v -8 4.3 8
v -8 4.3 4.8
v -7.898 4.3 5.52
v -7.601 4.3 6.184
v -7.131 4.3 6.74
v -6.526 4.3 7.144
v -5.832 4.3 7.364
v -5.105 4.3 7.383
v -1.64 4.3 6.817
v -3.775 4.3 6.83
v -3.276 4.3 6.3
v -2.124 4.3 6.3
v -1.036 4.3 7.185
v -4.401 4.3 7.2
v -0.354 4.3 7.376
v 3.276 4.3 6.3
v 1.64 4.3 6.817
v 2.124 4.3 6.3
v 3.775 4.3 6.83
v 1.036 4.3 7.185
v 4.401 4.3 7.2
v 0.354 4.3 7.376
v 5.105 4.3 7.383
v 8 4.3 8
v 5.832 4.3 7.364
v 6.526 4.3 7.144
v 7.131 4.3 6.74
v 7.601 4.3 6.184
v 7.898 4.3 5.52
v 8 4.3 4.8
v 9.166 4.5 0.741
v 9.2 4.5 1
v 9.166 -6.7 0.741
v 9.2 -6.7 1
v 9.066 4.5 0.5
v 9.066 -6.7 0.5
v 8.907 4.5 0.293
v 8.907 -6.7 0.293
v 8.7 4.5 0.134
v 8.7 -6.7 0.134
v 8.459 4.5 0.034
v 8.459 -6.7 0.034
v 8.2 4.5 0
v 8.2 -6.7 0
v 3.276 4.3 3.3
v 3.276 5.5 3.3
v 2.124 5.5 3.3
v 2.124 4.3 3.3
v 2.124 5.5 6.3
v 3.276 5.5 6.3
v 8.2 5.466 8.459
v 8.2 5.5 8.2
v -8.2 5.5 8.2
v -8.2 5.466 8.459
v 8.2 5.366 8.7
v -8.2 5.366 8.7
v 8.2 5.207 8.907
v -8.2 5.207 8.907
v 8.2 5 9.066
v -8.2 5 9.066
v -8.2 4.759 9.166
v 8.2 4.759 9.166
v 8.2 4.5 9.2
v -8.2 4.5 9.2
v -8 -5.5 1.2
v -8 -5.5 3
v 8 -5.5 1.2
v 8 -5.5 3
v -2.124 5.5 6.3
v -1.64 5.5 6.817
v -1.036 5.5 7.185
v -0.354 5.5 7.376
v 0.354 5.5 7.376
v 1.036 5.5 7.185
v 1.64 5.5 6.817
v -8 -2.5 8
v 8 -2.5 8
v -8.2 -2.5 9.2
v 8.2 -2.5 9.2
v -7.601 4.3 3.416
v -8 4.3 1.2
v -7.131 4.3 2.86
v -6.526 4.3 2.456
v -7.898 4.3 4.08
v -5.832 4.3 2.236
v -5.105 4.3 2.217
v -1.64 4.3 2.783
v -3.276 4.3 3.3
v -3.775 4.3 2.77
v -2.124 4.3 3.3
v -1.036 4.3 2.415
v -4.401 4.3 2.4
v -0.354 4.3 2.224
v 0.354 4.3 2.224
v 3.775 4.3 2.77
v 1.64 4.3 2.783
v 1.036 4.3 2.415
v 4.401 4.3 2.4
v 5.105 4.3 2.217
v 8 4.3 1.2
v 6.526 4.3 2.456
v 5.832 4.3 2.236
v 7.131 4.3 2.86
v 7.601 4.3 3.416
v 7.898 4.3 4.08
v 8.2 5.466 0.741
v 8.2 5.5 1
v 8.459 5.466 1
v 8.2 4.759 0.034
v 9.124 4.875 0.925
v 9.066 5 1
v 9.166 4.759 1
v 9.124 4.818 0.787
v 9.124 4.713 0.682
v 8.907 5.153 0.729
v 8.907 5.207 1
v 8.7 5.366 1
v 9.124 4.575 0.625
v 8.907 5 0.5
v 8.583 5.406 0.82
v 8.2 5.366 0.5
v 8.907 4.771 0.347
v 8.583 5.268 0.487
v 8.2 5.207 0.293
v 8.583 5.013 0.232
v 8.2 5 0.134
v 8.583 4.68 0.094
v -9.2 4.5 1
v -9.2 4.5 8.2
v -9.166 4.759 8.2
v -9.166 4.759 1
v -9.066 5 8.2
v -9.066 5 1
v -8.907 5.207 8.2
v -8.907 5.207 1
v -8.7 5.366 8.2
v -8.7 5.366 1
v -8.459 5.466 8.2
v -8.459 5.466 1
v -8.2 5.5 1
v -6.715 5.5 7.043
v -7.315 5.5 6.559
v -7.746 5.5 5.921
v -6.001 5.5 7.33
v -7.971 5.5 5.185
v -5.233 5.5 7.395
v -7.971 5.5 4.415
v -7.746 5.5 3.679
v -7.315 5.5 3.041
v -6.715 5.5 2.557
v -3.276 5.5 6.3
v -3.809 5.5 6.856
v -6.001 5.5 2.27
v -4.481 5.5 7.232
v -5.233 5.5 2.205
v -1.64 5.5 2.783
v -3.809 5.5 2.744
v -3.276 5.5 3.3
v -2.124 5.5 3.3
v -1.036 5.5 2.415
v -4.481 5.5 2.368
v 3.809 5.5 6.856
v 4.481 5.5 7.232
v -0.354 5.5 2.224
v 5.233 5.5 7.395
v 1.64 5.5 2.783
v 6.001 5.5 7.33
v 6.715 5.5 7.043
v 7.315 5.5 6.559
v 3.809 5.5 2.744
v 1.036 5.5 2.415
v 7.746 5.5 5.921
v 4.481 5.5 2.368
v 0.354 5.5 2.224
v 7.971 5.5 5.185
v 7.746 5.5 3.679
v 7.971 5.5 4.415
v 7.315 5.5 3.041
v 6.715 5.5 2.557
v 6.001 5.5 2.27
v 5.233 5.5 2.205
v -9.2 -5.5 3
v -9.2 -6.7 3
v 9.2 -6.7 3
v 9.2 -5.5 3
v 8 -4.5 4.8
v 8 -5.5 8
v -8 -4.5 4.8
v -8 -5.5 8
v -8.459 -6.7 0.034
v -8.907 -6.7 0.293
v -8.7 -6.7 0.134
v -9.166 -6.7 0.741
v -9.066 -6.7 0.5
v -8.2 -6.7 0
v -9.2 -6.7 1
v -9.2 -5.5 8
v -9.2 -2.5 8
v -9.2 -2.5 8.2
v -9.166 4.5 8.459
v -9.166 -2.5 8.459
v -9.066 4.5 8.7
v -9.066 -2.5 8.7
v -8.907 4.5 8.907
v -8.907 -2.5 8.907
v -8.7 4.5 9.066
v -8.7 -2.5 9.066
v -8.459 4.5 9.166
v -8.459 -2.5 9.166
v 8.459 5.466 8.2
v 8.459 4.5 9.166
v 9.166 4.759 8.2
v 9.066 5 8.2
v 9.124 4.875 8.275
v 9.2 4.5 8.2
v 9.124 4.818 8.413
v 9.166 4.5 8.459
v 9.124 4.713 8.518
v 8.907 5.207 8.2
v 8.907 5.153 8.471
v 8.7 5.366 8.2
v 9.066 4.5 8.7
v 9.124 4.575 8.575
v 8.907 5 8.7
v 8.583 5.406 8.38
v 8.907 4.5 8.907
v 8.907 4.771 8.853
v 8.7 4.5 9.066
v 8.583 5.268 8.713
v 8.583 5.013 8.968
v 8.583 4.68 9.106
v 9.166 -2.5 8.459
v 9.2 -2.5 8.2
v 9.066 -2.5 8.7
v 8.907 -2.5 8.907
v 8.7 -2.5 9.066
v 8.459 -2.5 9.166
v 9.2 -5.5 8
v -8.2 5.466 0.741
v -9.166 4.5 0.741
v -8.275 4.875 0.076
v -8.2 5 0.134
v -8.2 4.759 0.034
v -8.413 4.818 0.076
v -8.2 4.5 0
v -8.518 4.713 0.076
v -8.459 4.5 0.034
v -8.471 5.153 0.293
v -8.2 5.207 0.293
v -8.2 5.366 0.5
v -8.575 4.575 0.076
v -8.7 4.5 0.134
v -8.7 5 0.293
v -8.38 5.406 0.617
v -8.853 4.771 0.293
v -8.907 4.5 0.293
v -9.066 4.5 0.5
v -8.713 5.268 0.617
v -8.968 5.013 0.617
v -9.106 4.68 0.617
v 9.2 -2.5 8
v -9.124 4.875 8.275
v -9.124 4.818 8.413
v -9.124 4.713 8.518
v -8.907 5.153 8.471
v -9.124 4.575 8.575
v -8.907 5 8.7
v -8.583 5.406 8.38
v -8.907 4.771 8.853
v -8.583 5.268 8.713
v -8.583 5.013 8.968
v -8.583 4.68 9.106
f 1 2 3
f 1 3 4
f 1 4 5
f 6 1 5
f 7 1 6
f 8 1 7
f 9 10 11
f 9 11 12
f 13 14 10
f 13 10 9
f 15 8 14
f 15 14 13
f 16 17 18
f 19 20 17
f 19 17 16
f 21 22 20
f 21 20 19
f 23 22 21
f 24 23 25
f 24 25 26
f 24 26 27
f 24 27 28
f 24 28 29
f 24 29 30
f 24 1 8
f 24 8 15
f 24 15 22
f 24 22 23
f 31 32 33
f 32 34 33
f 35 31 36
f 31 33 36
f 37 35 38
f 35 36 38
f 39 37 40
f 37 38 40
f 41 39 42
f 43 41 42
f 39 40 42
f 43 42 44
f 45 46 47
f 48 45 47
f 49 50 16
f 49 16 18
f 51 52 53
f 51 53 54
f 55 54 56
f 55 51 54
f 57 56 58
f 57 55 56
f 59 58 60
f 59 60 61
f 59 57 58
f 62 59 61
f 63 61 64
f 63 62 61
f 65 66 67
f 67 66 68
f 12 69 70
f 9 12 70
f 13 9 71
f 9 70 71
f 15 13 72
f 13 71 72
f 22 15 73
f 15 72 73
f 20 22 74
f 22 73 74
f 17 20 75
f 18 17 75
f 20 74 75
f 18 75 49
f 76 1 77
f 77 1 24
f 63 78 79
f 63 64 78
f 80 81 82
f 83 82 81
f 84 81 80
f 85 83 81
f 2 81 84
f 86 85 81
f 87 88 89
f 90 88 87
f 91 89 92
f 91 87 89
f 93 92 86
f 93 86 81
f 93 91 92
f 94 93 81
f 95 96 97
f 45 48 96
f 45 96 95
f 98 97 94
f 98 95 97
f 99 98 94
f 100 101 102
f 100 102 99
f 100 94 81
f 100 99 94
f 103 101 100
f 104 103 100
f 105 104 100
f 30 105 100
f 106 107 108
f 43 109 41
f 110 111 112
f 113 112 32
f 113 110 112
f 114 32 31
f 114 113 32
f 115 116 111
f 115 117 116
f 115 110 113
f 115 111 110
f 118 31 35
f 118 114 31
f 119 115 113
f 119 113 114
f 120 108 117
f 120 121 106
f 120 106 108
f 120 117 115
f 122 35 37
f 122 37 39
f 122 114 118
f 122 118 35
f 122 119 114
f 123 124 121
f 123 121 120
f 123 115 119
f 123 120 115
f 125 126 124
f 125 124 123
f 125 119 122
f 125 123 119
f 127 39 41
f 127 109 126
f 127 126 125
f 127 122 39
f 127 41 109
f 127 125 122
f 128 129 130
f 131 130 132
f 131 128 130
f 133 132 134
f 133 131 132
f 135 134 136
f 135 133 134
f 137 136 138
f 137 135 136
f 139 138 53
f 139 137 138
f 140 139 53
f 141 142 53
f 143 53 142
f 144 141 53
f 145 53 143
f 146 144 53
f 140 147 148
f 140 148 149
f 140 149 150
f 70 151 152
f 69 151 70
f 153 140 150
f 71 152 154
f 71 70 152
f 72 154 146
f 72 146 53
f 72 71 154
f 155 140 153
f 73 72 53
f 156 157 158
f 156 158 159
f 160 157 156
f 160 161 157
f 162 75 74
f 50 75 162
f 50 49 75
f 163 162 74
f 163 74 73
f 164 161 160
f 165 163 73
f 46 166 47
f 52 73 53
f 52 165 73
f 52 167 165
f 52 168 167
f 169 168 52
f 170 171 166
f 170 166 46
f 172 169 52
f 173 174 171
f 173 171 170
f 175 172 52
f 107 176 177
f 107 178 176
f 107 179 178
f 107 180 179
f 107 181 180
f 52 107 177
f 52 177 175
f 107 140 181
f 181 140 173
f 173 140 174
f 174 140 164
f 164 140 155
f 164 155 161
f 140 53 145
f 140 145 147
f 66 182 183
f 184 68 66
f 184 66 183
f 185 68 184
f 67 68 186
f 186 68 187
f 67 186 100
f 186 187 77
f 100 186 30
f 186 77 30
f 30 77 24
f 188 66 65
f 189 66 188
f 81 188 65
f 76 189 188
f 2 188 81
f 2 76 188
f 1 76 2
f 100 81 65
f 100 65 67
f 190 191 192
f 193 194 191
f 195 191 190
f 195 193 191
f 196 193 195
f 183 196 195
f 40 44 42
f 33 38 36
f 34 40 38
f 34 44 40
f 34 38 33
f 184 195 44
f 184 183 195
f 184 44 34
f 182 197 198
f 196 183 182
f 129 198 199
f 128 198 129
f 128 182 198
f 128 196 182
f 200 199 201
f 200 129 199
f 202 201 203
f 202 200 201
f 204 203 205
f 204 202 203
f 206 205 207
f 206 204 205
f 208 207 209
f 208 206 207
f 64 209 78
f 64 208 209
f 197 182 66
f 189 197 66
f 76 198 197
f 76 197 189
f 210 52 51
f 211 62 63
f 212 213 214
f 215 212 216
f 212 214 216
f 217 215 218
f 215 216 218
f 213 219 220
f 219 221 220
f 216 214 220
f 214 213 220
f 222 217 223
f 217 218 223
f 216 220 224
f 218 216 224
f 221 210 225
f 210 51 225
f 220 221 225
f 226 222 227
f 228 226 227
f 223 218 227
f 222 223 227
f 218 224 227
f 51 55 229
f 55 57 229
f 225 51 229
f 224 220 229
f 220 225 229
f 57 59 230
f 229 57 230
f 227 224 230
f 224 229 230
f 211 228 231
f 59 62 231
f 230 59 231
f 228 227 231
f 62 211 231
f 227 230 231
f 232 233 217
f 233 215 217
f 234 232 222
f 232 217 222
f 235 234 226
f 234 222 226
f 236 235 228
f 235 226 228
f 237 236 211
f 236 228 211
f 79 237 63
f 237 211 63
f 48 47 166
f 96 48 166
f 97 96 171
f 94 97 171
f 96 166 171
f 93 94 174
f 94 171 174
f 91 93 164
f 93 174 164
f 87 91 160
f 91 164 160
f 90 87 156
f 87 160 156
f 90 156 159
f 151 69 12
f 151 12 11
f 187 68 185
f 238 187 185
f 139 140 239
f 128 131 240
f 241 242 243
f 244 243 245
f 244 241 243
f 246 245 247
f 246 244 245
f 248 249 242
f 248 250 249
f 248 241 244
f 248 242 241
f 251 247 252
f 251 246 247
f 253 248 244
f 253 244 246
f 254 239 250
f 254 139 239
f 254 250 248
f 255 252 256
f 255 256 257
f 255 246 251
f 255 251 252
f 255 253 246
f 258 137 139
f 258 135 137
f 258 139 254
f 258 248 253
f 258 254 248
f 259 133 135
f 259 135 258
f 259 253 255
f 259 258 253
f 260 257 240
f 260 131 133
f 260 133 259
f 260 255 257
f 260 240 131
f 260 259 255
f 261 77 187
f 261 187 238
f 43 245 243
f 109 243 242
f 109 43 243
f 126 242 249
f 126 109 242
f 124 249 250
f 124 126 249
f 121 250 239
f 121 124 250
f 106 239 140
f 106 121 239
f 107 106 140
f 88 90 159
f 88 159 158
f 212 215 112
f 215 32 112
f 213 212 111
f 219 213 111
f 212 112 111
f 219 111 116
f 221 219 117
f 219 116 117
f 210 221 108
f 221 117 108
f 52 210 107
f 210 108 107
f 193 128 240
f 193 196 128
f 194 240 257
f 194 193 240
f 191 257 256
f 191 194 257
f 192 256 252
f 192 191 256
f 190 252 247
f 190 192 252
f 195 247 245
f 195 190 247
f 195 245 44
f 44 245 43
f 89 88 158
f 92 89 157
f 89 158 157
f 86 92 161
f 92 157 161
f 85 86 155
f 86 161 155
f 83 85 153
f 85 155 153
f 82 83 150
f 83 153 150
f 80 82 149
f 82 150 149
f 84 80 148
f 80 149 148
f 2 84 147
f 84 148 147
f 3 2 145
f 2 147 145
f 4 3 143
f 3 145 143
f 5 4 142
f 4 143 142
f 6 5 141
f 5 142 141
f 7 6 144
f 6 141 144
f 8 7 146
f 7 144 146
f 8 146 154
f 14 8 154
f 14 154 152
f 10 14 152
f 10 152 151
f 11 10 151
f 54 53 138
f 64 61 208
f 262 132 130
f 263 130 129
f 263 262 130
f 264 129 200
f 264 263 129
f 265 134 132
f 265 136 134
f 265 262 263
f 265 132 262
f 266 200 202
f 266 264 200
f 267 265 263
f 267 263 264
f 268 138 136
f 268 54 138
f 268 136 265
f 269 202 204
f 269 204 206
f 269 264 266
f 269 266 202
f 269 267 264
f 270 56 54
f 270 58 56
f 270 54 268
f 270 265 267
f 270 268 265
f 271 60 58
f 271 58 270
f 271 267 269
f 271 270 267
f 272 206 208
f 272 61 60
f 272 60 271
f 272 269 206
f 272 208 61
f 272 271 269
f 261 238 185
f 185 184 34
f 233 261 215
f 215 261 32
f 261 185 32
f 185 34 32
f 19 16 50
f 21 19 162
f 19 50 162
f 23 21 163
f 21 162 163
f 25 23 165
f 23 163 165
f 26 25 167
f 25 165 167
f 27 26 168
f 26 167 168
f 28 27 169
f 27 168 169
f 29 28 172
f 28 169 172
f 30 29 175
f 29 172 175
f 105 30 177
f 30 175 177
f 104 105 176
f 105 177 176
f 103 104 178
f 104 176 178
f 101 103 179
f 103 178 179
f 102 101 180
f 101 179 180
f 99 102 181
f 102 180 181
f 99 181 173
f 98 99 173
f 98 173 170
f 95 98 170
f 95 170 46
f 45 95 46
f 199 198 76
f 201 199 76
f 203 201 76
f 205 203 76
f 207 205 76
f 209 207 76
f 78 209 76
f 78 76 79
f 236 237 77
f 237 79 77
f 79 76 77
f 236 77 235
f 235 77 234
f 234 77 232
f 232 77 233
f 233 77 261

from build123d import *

# Parameters (mm, degrees)
SKETCH_W        = 18.4
SKETCH_H        = 11
PAD_DEPTH       = 8
SKETCH002_R     = 2.6
POCKET_DEPTH    = 10
SKETCH003_W     = 16
SKETCH003_H     = 9.8
POCKET001_DEPTH = 6.8
SKETCH004_W     = 10.8
SKETCH004_H     = 3
POCKET002_DEPTH = 5
SKETCH005_W     = 18.4
SKETCH005_H     = 3
PAD001_DEPTH    = 1.2
SKETCH006_W     = 18.4
SKETCH006_H     = 8
PAD002_DEPTH    = 1.2
FILLET_R        = 1


with BuildPart() as part:
    # Sketch → Pad (new body)
    with BuildSketch(Plane.XY):
        Rectangle(SKETCH_W, SKETCH_H)
    extrude(amount=PAD_DEPTH)

    # Sketch002 (on Face3 of Pad) → Pocket (cut)
    with BuildSketch(Plane(origin=(0, 5.5, 0), x_dir=(-1, 0, 0), z_dir=(0, 1, 0))):
        with Locations((-5.4, 4.8)):
            Circle(SKETCH002_R)
        with Locations((0, 4.8)):
            Circle(SKETCH002_R)
        with Locations((5.4, 4.8)):
            Circle(SKETCH002_R)
    extrude(amount=-POCKET_DEPTH, mode=Mode.SUBTRACT)

    # Sketch003 (on Face5 of Pocket) → Pocket001 (cut)
    with BuildSketch(Plane.XY.offset(8)):
        with Locations((0, -0.6)):
            Rectangle(SKETCH003_W, SKETCH003_H)
    extrude(amount=-POCKET001_DEPTH, mode=Mode.SUBTRACT)

    # Sketch004 (on Face9 of Pocket001) → Pocket002 (cut)
    with BuildSketch(Plane(origin=(0, 5.5, 0), x_dir=(-1, 0, 0), z_dir=(0, 1, 0))):
        with Locations((0, 4.8)):
            Rectangle(SKETCH004_W, SKETCH004_H)
    extrude(amount=-POCKET002_DEPTH, mode=Mode.SUBTRACT)

    # Sketch005 (on Face1 of Pocket002) → Pad001 (join)
    with BuildSketch(Plane.XZ.offset(5.5)):
        with Locations((0, 1.5)):
            Rectangle(SKETCH005_W, SKETCH005_H)
    extrude(amount=PAD001_DEPTH)

    # Sketch006 (on Face4 of Pad001) → Pad002 (join)
    with BuildSketch(Plane.XY.offset(8)):
        with Locations((0, 1.5)):
            Rectangle(SKETCH006_W, SKETCH006_H)
    extrude(amount=PAD002_DEPTH)

    # Fillet
    fillet_edges = [part.edges().sort_by_distance(p)[0] for p in [
        (0, 5.5, 9.2),
        (-9.2, 5.5, 4.6),
        (0, 5.5, 0),
        (9.2, 5.5, 4.6),
        (9.2, 1.5, 9.2),
        (-9.2, 1.5, 9.2),
        (-9.2, -0.6, 0),
        (9.2, -0.6, 0),
    ]]
    fillet(fillet_edges, radius=FILLET_R)


solid = part.part
